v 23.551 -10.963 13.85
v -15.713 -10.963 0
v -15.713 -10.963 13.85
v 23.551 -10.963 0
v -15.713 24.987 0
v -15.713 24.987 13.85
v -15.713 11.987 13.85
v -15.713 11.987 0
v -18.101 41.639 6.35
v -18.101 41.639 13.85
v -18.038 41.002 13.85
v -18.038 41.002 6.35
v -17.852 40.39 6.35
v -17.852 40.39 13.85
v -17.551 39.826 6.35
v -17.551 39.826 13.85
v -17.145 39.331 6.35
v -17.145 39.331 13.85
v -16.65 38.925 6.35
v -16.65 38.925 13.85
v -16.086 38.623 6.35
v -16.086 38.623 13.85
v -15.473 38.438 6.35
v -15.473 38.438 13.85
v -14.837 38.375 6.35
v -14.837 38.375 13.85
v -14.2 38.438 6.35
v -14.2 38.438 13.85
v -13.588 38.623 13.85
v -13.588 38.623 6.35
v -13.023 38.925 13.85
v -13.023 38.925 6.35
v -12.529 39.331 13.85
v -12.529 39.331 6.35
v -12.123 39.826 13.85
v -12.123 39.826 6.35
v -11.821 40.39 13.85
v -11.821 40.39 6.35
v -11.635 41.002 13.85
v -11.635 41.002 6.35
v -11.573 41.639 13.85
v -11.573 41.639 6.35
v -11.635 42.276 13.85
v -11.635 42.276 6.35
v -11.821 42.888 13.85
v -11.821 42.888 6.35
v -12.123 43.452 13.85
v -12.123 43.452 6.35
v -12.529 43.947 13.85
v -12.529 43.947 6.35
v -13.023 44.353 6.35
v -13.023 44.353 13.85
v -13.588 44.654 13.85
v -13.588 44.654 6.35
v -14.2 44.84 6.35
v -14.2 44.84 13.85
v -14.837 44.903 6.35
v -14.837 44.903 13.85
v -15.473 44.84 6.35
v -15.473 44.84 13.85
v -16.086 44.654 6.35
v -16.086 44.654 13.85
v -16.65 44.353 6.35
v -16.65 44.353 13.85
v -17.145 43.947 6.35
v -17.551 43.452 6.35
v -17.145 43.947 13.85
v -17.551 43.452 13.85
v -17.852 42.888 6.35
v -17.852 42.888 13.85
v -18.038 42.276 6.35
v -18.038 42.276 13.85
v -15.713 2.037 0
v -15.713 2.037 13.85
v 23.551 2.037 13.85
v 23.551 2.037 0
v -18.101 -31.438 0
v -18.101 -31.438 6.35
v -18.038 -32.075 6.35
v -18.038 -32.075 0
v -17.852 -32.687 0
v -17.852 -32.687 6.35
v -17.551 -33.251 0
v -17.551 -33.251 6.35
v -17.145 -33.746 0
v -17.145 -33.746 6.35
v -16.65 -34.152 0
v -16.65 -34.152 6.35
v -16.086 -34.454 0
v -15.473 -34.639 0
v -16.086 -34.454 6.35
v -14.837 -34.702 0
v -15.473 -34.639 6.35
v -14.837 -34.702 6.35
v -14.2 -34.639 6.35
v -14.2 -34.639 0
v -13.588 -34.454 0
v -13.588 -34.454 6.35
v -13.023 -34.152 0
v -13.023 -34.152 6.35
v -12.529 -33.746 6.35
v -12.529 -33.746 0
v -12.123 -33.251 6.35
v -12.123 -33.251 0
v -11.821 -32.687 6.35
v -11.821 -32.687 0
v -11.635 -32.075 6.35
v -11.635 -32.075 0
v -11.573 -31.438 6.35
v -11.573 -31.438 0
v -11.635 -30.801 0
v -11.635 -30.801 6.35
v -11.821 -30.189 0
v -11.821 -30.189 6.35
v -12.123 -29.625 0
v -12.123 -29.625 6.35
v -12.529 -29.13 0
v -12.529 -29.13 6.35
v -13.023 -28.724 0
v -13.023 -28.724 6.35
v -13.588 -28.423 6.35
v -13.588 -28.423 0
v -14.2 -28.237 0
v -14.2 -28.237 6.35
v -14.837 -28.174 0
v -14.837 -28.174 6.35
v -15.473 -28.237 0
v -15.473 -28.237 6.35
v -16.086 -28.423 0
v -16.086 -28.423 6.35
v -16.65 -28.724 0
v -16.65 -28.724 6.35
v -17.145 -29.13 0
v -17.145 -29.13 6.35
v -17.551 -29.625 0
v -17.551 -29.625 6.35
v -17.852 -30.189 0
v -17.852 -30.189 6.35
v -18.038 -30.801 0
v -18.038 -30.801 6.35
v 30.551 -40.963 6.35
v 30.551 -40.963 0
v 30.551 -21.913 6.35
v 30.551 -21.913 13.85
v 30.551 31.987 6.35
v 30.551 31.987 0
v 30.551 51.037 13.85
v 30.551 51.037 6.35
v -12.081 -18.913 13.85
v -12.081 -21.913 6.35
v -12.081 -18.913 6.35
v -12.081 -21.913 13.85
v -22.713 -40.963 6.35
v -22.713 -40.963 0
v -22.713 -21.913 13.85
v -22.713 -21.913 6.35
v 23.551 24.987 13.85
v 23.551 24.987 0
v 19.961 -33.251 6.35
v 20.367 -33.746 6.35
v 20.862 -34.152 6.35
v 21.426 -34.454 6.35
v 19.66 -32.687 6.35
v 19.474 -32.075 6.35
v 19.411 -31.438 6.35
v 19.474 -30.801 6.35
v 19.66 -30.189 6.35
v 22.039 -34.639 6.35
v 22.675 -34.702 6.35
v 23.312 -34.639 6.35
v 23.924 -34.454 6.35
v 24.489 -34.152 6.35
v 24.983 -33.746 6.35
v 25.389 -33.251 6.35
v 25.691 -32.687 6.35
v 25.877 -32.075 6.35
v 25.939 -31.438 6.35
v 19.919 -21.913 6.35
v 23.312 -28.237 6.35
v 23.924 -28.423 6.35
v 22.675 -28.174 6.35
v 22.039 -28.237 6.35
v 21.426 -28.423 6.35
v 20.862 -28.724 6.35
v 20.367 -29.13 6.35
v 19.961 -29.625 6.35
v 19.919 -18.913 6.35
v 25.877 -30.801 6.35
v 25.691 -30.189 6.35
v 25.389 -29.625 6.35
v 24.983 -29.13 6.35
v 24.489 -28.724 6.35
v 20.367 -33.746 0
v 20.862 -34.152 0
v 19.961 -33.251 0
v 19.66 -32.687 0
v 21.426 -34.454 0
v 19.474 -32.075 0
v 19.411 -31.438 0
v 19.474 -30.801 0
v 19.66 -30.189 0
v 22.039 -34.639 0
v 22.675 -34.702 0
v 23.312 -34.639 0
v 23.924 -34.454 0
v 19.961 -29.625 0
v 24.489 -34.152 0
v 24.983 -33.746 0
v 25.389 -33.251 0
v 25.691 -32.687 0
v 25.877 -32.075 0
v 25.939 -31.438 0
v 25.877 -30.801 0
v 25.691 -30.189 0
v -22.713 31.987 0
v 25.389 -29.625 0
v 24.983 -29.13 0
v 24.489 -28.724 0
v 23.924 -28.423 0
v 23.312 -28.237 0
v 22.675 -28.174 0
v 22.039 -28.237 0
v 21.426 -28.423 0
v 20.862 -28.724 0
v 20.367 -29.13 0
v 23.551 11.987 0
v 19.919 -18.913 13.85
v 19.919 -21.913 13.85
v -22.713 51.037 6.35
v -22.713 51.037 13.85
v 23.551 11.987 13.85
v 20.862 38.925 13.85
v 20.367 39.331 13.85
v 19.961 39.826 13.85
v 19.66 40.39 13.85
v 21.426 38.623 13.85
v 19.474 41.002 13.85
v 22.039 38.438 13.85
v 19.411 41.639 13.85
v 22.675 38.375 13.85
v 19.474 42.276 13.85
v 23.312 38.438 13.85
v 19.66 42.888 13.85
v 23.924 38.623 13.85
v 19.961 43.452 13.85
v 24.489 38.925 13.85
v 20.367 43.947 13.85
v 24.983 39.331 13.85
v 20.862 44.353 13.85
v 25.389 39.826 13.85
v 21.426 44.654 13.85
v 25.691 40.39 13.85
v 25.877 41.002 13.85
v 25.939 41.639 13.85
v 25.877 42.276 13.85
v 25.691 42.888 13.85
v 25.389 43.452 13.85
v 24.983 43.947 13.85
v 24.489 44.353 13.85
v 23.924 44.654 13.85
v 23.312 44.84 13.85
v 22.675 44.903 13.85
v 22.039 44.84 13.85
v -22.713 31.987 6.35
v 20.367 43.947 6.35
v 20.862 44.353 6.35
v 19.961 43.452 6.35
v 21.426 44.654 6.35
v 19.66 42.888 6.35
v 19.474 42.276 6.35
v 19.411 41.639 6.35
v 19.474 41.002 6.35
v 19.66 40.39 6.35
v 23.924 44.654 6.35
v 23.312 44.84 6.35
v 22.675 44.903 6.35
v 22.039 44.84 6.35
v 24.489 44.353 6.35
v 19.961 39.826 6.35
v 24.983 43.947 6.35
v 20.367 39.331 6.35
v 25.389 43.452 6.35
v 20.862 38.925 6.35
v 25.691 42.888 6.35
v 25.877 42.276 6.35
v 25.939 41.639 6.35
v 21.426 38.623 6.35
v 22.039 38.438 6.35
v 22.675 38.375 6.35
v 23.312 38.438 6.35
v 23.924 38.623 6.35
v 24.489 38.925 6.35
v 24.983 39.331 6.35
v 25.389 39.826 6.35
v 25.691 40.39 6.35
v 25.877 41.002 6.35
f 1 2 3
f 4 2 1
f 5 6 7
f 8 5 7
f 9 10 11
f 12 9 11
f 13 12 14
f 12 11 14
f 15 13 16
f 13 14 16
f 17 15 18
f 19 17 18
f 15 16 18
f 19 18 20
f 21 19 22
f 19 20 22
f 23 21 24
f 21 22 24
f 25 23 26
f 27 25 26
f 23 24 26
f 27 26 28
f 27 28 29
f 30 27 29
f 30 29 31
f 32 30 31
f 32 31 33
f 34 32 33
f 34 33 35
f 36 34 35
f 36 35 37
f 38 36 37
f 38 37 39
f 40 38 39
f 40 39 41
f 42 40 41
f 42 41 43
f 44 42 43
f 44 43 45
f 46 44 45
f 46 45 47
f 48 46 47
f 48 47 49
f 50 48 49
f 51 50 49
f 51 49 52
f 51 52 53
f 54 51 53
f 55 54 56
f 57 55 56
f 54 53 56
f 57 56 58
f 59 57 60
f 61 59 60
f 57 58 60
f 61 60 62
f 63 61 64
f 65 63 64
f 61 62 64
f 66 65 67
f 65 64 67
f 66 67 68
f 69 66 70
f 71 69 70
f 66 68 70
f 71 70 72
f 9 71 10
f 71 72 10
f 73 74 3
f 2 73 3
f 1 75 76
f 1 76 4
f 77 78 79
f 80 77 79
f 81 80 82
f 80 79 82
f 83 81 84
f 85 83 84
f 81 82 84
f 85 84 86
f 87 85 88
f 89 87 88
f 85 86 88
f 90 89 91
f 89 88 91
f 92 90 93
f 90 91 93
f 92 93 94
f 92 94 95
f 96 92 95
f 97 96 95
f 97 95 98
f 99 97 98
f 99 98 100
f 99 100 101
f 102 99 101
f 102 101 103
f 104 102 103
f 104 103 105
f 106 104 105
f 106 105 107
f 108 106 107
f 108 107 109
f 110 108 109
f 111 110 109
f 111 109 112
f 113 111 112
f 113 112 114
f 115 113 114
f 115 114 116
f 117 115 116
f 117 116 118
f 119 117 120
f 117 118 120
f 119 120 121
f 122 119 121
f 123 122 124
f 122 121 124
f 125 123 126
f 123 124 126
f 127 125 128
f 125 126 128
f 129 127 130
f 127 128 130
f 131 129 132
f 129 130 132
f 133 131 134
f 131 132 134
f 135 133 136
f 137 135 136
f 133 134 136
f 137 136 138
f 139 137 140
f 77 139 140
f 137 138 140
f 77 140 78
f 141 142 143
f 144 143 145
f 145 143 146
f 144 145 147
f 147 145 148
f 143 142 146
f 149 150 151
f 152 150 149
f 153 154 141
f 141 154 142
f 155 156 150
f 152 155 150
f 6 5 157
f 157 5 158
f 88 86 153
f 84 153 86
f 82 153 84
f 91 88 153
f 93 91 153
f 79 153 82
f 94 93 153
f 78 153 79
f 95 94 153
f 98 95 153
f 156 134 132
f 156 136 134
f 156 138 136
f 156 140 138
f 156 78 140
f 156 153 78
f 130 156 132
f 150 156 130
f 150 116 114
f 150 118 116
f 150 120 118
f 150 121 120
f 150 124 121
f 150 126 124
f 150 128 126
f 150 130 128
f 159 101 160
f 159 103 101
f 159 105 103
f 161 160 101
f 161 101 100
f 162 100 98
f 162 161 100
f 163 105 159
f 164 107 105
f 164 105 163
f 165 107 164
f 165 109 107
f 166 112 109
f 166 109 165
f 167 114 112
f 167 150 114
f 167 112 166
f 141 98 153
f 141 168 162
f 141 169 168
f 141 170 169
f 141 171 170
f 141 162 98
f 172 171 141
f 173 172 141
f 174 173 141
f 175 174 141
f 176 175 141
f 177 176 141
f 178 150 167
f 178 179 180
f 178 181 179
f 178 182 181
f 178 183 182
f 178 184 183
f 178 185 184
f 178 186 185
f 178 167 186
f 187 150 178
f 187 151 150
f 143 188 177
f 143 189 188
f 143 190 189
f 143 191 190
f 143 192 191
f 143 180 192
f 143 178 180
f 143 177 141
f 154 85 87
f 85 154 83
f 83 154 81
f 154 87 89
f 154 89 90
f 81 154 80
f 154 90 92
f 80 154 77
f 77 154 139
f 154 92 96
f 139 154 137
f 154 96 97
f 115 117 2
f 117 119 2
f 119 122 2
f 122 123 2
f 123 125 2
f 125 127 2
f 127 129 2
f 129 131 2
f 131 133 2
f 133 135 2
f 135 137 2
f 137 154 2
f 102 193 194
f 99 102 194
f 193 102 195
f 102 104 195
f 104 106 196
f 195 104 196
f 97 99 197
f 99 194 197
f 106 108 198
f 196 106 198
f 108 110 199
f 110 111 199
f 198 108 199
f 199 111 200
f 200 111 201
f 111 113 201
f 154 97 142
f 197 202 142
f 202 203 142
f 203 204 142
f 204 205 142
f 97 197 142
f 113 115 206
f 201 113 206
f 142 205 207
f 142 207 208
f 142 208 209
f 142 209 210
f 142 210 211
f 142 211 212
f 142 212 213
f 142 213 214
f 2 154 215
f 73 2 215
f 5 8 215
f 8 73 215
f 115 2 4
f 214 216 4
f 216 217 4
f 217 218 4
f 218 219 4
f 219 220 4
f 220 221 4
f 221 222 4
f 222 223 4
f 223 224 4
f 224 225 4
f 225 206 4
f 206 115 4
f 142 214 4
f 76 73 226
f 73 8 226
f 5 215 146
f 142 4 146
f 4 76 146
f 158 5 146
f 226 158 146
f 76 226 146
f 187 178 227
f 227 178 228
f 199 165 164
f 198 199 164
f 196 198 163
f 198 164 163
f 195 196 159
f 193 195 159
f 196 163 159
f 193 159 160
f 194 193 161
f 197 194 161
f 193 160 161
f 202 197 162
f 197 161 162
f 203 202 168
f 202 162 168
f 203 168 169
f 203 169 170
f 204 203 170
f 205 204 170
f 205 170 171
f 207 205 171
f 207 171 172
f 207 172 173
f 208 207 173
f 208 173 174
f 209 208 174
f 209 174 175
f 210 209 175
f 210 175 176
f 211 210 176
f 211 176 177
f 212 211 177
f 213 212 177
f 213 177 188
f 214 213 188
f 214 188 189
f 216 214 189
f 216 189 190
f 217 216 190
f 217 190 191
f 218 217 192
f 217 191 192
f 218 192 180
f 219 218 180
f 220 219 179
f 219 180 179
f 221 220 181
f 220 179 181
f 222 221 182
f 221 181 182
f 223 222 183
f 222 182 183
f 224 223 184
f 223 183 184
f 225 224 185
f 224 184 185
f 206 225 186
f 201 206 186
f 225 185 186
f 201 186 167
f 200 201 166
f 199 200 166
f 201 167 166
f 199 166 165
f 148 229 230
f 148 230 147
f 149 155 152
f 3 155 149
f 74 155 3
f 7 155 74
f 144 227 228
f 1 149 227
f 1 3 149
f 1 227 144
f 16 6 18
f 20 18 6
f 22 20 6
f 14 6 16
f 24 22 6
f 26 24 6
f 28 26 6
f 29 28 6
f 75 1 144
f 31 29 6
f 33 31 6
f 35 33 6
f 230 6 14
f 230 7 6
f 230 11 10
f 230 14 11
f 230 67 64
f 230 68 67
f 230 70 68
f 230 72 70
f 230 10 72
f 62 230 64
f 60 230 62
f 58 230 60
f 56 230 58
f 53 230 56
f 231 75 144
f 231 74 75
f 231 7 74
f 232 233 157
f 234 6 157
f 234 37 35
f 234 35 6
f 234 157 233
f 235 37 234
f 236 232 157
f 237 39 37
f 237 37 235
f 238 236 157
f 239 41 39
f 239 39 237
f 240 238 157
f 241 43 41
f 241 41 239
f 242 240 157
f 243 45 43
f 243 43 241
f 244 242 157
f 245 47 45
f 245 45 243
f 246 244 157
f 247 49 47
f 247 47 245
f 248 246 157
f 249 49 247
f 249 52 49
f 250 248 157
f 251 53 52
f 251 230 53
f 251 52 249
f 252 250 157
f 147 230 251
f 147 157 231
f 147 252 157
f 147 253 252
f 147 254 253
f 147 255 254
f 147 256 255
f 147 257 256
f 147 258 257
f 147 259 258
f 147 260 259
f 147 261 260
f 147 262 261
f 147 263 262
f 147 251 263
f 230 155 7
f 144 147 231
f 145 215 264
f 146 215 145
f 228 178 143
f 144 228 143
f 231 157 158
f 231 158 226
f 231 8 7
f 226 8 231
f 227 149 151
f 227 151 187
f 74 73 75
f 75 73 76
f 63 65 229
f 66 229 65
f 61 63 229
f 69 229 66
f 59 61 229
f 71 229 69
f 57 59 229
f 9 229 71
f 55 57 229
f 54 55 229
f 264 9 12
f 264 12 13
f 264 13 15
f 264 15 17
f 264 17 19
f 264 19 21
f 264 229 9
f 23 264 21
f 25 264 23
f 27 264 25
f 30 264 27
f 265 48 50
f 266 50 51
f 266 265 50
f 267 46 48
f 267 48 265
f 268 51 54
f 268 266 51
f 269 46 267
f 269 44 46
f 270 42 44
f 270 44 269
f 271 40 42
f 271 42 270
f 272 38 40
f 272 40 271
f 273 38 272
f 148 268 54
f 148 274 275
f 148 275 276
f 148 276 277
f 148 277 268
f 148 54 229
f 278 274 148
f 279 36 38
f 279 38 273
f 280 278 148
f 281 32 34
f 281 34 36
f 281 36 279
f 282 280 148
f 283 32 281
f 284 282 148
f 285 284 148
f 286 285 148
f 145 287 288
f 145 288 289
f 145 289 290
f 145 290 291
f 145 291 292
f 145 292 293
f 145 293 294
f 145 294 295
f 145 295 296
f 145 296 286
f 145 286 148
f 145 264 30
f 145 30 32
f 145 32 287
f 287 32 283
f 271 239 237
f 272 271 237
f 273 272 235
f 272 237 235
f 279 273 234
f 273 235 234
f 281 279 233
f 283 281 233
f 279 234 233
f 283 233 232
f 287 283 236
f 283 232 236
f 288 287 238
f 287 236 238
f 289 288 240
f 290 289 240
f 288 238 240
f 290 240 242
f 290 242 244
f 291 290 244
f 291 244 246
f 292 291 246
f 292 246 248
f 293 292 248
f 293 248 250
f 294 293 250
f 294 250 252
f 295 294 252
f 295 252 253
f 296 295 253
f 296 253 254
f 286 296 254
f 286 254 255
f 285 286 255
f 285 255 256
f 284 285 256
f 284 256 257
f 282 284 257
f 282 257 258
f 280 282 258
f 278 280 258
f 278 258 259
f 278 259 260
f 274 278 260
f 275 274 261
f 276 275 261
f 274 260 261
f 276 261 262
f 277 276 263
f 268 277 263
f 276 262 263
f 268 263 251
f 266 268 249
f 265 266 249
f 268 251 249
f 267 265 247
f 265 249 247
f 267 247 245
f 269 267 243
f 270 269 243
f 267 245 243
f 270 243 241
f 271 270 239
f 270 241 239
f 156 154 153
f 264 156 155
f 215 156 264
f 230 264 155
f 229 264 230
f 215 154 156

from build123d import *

# Parameters (mm, degrees)
F0_W      = 53.264
F0_H      = 92
F1_DEPTH  = 12.7
F2_W      = 53.264
F2_H      = 19.05
F3_DEPTH  = 6.35
F4_W      = 53.264
F4_H      = 19.05
F5_DEPTH  = 6.35
F6_DEPTH  = 1.15
F7_D      = 6.528
F8_W      = 39.264
F8_H      = 13
F9_DEPTH  = 13.851
F10_W     = 32
F10_H     = 7.5
F11_DEPTH = 3


with BuildPart() as f1:
    # F0 (on Top) → F1 (new body)
    with BuildSketch(Plane.XY):
        with Locations((3.9193365263, 5.0369417648)):
            Rectangle(F0_W, F0_H)
    extrude(amount=F1_DEPTH)

    # F2 (on face) → F3 (cut)
    with BuildSketch(Plane(origin=(0, 0, 0), x_dir=(1, 0, 0), z_dir=(0, 0, -1))):
        with Locations((3.9193365263, -41.5119417648)):
            Rectangle(F2_W, F2_H)
    extrude(amount=-F3_DEPTH, mode=Mode.SUBTRACT)

    # F4 (on face) → F5 (cut)
    with BuildSketch(Plane.XY.offset(12.7)):
        with Locations((3.9193365263, -31.4380582352)):
            Rectangle(F4_W, F4_H)
    extrude(amount=-F5_DEPTH, mode=Mode.SUBTRACT)

    # F6 (add): a face of the model
    f6_faces = [f1.faces().sort_by_distance(p)[0] for p in [
        (3.9193365263, 14.5619417648, 12.7),
    ]]
    extrude(f6_faces, amount=F6_DEPTH)

    # F7 (through all)
    with Locations(Plane(origin=(0, 0, 0), x_dir=(1, 0, 0), z_dir=(0, 0, -1))):
        with Locations((-14.8366634737, 31.4380582352), (22.6753365263, 31.4380582352), (-14.8366634737, -41.6389417648), (22.6753365263, -41.6389417648)):
            Hole(F7_D / 2)

    # F8 (on face) → F9 (cut, through all)
    with BuildSketch(Plane(origin=(0, 0, 0), x_dir=(1, 0, 0), z_dir=(0, 0, -1))):
        with Locations((3.9193365263, 4.4630582352)):
            Rectangle(F8_W, F8_H)
        with Locations((3.9193365263, -18.4869417648)):
            Rectangle(F8_W, F8_H)
    extrude(amount=-F9_DEPTH, mode=Mode.SUBTRACT)

    # F10 (on face) → F11 (cut)
    with BuildSketch(Plane.XZ.offset(21.9130582352)):
        with Locations((3.9193365263, 10.1)):
            Rectangle(F10_W, F10_H)
    extrude(amount=-F11_DEPTH, mode=Mode.SUBTRACT)


solid = f1.part
